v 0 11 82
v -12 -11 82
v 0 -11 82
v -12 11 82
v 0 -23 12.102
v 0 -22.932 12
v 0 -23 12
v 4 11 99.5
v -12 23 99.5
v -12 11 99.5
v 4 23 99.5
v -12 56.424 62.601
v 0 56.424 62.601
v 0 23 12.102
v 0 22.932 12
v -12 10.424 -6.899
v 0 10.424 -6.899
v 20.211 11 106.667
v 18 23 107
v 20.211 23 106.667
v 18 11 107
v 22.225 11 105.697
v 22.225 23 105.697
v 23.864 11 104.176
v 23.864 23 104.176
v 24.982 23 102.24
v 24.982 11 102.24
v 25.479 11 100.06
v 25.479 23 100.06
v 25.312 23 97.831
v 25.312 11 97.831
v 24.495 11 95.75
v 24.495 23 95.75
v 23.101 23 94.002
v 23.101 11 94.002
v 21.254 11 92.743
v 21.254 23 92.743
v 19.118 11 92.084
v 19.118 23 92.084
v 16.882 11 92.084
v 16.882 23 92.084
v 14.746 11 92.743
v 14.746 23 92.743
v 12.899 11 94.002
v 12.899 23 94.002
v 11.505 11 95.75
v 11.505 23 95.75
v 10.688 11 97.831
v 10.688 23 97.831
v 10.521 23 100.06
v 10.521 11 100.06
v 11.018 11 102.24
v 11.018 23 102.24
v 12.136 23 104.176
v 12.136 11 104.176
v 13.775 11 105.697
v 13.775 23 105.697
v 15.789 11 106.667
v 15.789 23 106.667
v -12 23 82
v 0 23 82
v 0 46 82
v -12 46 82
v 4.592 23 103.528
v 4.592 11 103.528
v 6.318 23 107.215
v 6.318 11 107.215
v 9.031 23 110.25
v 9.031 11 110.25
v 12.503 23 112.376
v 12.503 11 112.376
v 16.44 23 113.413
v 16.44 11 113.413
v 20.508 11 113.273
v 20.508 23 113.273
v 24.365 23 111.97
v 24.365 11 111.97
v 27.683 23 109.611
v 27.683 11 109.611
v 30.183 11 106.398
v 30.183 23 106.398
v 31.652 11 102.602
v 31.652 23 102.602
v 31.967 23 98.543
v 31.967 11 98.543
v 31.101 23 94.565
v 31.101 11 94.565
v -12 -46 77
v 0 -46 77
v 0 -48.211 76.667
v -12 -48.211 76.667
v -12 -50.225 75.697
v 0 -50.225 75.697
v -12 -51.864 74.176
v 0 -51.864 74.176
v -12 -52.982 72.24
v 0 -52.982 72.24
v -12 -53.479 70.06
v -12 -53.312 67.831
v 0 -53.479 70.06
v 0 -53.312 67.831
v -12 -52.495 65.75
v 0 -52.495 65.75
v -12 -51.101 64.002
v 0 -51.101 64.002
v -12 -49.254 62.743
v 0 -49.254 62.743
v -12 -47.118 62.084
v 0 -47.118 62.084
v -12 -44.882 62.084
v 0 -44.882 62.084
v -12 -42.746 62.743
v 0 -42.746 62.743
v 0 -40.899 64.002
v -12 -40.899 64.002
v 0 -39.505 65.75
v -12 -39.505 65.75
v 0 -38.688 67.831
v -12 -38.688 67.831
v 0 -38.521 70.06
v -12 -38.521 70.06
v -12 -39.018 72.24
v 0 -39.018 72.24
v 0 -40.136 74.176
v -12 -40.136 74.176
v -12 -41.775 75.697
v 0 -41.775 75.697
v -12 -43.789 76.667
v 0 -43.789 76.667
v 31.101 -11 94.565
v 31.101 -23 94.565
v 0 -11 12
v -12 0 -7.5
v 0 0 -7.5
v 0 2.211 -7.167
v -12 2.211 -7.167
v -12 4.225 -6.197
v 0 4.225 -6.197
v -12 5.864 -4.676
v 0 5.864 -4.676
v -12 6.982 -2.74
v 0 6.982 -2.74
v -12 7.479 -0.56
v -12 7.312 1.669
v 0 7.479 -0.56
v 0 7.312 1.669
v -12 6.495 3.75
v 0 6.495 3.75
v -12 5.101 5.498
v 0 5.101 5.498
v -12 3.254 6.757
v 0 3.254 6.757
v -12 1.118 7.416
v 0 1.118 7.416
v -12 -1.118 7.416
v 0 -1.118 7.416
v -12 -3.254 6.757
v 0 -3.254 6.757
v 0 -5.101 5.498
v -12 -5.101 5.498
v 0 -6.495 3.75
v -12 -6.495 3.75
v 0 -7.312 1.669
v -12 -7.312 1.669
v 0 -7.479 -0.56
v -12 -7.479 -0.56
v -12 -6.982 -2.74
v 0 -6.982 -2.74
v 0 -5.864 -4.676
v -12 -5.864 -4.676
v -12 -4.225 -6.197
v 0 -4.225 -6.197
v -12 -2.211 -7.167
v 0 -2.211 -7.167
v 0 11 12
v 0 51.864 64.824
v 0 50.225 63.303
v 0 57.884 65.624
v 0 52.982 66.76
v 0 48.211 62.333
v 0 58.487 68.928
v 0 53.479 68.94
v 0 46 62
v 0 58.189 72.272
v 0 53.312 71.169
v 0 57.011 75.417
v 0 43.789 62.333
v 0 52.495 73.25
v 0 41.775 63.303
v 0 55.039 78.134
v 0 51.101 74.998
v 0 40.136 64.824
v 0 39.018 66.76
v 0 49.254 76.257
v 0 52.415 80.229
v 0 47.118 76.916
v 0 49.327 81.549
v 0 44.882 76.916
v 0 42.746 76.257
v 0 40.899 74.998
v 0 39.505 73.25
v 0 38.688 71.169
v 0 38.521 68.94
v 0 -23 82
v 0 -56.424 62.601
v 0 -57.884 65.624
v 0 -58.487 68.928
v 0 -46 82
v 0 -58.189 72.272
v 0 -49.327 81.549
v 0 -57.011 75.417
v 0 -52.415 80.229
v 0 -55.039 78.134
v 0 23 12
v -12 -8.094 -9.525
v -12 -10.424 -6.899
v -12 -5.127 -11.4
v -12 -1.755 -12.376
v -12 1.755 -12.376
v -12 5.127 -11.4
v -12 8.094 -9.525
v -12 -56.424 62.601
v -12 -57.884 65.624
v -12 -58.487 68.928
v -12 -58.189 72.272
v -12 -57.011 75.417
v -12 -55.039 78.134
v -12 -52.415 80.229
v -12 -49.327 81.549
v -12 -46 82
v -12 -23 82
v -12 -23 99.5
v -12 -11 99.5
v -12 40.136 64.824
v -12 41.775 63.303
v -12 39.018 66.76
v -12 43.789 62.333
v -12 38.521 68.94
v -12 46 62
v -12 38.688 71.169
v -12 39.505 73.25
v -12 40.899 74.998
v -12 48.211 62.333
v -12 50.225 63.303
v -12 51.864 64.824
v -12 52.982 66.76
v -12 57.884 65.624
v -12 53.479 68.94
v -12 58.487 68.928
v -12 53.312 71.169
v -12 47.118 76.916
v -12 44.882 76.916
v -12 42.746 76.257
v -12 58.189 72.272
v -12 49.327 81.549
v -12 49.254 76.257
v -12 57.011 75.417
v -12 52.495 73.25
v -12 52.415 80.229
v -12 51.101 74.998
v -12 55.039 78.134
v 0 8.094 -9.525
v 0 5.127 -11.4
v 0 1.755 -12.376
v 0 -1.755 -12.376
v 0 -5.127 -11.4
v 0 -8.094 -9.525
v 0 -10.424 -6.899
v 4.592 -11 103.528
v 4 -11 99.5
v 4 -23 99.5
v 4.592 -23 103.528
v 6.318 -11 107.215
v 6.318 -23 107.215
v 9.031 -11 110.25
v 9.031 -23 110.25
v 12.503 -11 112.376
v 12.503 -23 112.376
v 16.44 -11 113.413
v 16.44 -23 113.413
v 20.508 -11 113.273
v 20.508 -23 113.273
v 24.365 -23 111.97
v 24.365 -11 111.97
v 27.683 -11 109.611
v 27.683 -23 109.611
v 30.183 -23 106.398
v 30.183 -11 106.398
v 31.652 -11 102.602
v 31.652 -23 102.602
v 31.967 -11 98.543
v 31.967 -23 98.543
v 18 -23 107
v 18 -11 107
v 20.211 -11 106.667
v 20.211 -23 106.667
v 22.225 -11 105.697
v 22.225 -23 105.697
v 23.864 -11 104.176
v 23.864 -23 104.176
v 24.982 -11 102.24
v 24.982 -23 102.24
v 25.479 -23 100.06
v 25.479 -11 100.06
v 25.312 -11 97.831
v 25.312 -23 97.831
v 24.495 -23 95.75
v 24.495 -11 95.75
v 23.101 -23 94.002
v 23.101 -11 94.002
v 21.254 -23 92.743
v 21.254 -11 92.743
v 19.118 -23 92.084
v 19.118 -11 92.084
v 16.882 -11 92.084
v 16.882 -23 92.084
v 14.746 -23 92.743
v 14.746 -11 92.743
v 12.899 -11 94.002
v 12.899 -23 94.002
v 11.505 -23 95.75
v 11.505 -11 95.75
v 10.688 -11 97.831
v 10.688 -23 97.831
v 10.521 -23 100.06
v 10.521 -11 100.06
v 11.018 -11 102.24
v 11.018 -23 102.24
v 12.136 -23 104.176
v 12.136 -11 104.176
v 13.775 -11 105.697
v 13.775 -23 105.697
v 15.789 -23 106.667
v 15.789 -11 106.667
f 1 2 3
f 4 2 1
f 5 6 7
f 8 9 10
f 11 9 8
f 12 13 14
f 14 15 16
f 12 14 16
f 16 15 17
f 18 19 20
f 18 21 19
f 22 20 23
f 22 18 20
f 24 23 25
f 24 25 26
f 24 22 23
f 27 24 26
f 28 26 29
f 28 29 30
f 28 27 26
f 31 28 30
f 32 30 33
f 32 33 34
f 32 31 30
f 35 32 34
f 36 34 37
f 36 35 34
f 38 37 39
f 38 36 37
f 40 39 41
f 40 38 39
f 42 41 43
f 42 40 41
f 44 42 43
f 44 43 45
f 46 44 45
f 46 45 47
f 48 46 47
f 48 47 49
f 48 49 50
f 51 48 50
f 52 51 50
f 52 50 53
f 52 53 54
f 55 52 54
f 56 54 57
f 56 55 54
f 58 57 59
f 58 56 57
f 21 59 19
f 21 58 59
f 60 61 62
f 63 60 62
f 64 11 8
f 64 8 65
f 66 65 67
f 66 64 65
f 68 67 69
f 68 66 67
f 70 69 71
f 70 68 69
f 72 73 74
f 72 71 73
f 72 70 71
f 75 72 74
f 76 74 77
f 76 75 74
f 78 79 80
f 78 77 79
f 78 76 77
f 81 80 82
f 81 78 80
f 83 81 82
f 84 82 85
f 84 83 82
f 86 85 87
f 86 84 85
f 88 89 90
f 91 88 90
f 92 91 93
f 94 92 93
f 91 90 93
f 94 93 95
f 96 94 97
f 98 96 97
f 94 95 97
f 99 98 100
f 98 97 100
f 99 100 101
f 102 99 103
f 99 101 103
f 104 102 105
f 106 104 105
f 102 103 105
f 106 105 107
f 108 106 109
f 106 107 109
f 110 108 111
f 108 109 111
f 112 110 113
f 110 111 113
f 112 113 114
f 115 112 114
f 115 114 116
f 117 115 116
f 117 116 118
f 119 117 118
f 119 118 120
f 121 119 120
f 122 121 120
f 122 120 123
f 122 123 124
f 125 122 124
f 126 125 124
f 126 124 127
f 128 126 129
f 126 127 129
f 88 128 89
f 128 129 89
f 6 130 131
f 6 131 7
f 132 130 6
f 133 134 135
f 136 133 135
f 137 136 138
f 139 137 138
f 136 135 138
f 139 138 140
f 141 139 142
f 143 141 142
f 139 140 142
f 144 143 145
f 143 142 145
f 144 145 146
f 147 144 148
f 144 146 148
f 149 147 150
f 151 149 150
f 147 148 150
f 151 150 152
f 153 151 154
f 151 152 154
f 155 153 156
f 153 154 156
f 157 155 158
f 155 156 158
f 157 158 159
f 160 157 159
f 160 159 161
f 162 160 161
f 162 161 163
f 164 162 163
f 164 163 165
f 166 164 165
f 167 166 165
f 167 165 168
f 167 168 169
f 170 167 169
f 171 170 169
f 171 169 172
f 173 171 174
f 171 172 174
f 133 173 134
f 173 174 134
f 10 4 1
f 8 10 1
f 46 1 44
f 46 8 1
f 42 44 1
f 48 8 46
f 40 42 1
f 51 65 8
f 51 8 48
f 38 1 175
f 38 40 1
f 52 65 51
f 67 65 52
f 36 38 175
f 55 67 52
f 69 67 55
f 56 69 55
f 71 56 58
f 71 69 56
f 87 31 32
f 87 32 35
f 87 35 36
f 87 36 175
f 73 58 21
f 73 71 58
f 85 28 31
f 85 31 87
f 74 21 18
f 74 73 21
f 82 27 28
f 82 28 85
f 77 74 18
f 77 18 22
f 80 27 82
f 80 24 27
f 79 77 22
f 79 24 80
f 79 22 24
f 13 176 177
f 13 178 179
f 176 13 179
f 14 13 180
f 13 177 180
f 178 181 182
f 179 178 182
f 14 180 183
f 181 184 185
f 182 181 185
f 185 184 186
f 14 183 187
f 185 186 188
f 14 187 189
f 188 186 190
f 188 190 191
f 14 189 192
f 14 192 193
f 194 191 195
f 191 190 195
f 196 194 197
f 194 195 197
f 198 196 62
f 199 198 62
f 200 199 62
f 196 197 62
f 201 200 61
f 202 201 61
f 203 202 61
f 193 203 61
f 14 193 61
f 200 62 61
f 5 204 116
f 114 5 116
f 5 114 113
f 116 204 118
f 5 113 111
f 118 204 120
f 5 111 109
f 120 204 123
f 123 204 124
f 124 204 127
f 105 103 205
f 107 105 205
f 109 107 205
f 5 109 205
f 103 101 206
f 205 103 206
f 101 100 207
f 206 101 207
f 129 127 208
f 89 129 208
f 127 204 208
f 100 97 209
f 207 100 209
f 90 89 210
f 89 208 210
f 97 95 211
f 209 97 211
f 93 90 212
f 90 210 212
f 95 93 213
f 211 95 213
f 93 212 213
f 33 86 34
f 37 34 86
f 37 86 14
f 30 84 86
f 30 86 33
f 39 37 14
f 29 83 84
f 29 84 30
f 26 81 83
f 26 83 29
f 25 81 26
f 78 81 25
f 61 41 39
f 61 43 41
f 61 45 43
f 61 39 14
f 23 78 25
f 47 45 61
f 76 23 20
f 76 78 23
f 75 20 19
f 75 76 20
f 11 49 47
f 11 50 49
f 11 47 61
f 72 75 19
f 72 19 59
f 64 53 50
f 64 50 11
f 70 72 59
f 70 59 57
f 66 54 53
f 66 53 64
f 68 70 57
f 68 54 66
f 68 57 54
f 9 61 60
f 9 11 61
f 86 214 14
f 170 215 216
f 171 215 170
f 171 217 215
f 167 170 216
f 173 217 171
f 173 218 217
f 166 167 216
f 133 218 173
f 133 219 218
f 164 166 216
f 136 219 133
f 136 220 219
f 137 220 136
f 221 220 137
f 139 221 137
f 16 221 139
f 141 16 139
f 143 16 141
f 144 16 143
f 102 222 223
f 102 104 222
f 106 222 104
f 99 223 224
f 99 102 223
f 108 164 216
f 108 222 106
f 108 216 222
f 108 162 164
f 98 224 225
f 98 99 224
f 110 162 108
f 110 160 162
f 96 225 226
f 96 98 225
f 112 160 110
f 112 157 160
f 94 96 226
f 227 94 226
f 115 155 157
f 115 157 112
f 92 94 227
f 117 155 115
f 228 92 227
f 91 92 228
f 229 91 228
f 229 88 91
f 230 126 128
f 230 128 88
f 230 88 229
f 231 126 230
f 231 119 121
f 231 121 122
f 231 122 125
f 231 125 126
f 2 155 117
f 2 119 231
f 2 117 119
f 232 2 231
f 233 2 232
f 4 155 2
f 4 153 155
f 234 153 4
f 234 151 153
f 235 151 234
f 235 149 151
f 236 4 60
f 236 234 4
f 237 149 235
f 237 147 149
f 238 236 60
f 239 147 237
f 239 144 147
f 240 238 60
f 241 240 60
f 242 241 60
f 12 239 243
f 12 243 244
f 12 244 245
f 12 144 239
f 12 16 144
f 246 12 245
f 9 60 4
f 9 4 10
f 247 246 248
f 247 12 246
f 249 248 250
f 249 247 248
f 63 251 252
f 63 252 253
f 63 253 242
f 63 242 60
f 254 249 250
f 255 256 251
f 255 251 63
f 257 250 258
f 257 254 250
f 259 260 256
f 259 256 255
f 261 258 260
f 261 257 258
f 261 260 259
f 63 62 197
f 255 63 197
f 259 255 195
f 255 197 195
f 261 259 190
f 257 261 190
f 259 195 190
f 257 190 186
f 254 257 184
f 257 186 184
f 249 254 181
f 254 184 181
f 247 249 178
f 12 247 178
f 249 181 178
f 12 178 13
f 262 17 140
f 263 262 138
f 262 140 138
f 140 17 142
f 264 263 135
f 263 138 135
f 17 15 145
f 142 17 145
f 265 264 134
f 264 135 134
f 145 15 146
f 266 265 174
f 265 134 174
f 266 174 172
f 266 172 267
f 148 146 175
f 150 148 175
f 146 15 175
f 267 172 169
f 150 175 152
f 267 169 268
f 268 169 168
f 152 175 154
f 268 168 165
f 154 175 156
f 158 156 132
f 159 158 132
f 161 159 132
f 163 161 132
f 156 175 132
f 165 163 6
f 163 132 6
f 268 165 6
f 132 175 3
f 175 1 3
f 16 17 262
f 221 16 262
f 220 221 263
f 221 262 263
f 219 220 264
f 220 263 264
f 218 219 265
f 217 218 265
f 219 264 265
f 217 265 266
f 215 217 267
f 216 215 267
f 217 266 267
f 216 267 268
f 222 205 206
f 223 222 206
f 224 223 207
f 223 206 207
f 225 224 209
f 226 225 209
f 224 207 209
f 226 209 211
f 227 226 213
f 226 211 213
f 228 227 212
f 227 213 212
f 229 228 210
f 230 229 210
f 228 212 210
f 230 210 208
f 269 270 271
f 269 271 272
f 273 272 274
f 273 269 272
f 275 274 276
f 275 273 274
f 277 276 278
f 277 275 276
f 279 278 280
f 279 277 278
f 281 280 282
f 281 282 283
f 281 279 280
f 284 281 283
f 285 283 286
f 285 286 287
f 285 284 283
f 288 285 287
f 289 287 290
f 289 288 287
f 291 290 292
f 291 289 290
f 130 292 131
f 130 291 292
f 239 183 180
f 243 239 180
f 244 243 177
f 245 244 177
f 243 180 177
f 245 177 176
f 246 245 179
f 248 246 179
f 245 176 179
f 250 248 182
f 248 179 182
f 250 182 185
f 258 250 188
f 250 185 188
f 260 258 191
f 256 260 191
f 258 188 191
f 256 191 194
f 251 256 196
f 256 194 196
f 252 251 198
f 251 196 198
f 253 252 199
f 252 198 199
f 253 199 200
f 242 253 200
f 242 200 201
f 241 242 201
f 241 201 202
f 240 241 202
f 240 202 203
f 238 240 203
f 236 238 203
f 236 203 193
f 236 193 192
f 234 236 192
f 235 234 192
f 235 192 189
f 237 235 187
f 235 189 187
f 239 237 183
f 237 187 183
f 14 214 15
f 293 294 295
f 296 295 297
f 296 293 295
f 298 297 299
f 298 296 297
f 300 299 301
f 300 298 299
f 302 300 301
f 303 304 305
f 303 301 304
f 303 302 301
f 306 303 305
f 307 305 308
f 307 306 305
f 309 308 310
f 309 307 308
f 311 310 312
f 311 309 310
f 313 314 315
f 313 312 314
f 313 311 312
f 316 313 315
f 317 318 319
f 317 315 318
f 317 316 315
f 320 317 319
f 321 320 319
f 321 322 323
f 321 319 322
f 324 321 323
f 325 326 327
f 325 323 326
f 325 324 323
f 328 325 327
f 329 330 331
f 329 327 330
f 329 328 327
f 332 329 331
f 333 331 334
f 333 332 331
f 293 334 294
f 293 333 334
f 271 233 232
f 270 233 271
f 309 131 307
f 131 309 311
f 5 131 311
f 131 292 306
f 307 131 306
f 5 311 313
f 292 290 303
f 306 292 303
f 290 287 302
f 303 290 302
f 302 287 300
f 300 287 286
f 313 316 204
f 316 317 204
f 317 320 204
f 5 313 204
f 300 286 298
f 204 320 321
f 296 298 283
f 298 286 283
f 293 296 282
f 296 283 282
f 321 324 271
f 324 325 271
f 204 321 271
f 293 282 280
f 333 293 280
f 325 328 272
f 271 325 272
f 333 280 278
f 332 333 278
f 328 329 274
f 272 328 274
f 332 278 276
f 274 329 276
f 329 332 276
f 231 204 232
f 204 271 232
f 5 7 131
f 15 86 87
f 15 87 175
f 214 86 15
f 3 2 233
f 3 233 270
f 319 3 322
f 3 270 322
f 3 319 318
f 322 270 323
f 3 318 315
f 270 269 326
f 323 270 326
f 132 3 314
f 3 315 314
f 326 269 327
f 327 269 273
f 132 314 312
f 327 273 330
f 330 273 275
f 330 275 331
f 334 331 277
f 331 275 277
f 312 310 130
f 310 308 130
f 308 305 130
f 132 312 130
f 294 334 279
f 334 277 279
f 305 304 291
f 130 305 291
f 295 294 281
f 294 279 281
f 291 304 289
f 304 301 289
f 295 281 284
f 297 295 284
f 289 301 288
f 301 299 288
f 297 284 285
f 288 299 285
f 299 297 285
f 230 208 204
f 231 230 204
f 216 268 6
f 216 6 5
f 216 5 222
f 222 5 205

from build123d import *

# Parameters (mm, degrees)
SKETCH1_R               = 7.5
BOSS_EXTRUDE1_DEPTH     = 12
SKETCH2_R               = 7.5
BOSS_EXTRUDE2_DEPTH     = 23
CUT_EXTRUDE1_REACH      = 132.347
SKETCH3_W               = 44
SKETCH3_H               = 22
CUT_EXTRUDE2_DEPTH      = 116.656819946
CUT_EXTRUDE2_DEPTH_BACK = 116.656819946
SKETCH4_W               = 28
SKETCH4_H               = 22
CUT_EXTRUDE3_DEPTH      = 116.656819946
CUT_EXTRUDE3_DEPTH_BACK = 116.656819946
SKETCH5_W               = 4
SKETCH5_H               = 22


with BuildPart() as part:
    # Sketch1 → Boss-Extrude1 (new body)
    with BuildSketch(Plane.YZ):
        with BuildLine():
            Line((-46, 82), (46, 82))
            ThreePointArc((46, 82), (57.011103253, 75.416553486), (56.423645014, 62.600896825))
            Line((56.423645014, 62.600896825), (10.423645014, -6.899103175))
            ThreePointArc((10.423645014, -6.899103175), (0, -12.5), (-10.423645014, -6.899103175))
            Line((-10.423645014, -6.899103175), (-56.423645014, 62.600896825))
            ThreePointArc((-56.423645014, 62.600896825), (-57.011103253, 75.416553486), (-46, 82))
        make_face()
        with Locations(Location((0, 0, 0), (0, 0, 270))):
            Circle(SKETCH1_R, mode=Mode.SUBTRACT)
        with Locations(Location((46, 69.5, 0), (0, 0, 270))):
            Circle(SKETCH1_R, mode=Mode.SUBTRACT)
        with Locations(Location((-46, 69.5, 0), (0, 0, 90))):
            Circle(SKETCH1_R, mode=Mode.SUBTRACT)
    extrude(amount=-BOSS_EXTRUDE1_DEPTH)

    # Sketch2 → Boss-Extrude2 (add, symmetric)
    with BuildSketch(Plane(origin=(0, 0, 0), x_dir=(-1, 0, 0), z_dir=(0, 1, 0))):
        with BuildLine():
            Line((12, 99.5), (-4, 99.5))
            ThreePointArc((-4, 99.5), (-20.50814275, 113.273497012), (-31.101317135, 94.564871904))
            Line((-31.101317135, 94.564871904), (0, 12))
            Line((0, 12), (0, 82))
            Line((0, 82), (12, 82))
            Line((12, 82), (12, 99.5))
        make_face()
        with Locations(Location((-18, 99.5, 0), (0, 0, 90))):
            Circle(SKETCH2_R, mode=Mode.SUBTRACT)
    extrude(amount=BOSS_EXTRUDE2_DEPTH, both=True)

    # Cut-Extrude1: up to this face of the body (flat: up to its plane)
    cut_extrude1_end = Plane(part.part.faces().sort_by_distance((-6, -34.5, 82))[0])
    # Sketch3 → Cut-Extrude1 (cut, up to the picked face)
    with BuildSketch(Plane.XY.offset(99.5), mode=Mode.PRIVATE) as cut_extrude1_sk1:
        with Locations((10, 0)):
            Rectangle(SKETCH3_W, SKETCH3_H)
    cut_extrude1_tool1 = split(extrude(cut_extrude1_sk1.sketch, amount=-CUT_EXTRUDE1_REACH, mode=Mode.PRIVATE), bisect_by=cut_extrude1_end, keep=Keep.BOTH, mode=Mode.PRIVATE)
    add(cut_extrude1_tool1.solids().sort_by(Axis((10, 0, 99.5), (0, 0, -1)))[0], mode=Mode.SUBTRACT)

    # Sketch4 → Cut-Extrude2 (cut, two sides: drawn at the far end of the back side and taken through both)
    with BuildSketch(Plane.XY.offset(82).offset(-CUT_EXTRUDE2_DEPTH_BACK)):
        with Locations((18, 0)):
            Rectangle(SKETCH4_W, SKETCH4_H)
    extrude(amount=CUT_EXTRUDE2_DEPTH + CUT_EXTRUDE2_DEPTH_BACK, mode=Mode.SUBTRACT)

    # Sketch5 → Cut-Extrude3 (cut, two sides: drawn at the far end of the back side and taken through both)
    with BuildSketch(Plane.XY.offset(82).offset(-CUT_EXTRUDE3_DEPTH_BACK)):
        with Locations((2, 0)):
            Rectangle(SKETCH5_W, SKETCH5_H)
    extrude(amount=CUT_EXTRUDE3_DEPTH + CUT_EXTRUDE3_DEPTH_BACK, mode=Mode.SUBTRACT)


solid = part.part
